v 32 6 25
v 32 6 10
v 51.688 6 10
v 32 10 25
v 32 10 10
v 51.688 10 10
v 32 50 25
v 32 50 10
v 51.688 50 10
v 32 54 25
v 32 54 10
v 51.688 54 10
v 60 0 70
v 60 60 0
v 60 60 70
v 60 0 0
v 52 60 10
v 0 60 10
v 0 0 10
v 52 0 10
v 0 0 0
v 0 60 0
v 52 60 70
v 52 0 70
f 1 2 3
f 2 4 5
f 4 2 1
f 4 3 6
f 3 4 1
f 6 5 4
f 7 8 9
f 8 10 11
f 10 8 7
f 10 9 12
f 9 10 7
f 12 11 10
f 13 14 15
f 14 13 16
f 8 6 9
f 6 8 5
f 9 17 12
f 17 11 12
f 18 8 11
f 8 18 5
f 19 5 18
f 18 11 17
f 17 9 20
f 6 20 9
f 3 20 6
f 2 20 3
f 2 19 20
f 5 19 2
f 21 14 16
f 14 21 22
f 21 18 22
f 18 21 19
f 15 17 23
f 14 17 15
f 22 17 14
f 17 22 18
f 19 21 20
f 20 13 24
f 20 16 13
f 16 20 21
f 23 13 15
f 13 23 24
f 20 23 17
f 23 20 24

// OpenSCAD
$fn = 32;

// ----------------------------------------------------------------------
// Rib bracket: 2-gusset L bracket
// ----------------------------------------------------------------------

// --- parameters (mm) ---
base_l = 60;              // foot length, X
base_w = 60;              // foot width, Y
base_t = 10;              // foot thickness
plate_t = 8;              // upright plate thickness
plate_h = 70;             // overall height
gus_l = 20;               // gusset leg along the foot
gus_h = 16;               // gusset height
gus_t = 4;                // gusset thickness
gus_edge = 6;             // gusset margin from the foot edge
n_gus = 2;                // gusset count

gus_pitch = (base_w - 2 * gus_edge - gus_t) / (n_gus - 1);  // gusset pitch

union() {
  cube([base_l, base_w, base_t]);
  translate([base_l - plate_t, 0, base_t - 1])
    cube([plate_t, base_w, plate_h - base_t + 1]);
  for (i = [0 : n_gus - 1])
    translate([base_l - plate_t - gus_l, gus_edge + i * gus_pitch, base_t - 1])
      rotate([-90, 0, 0])
        linear_extrude(height = gus_t)
          polygon(points = [[0, 0], [gus_l + 1, 0], [0, -gus_h]]);
}
